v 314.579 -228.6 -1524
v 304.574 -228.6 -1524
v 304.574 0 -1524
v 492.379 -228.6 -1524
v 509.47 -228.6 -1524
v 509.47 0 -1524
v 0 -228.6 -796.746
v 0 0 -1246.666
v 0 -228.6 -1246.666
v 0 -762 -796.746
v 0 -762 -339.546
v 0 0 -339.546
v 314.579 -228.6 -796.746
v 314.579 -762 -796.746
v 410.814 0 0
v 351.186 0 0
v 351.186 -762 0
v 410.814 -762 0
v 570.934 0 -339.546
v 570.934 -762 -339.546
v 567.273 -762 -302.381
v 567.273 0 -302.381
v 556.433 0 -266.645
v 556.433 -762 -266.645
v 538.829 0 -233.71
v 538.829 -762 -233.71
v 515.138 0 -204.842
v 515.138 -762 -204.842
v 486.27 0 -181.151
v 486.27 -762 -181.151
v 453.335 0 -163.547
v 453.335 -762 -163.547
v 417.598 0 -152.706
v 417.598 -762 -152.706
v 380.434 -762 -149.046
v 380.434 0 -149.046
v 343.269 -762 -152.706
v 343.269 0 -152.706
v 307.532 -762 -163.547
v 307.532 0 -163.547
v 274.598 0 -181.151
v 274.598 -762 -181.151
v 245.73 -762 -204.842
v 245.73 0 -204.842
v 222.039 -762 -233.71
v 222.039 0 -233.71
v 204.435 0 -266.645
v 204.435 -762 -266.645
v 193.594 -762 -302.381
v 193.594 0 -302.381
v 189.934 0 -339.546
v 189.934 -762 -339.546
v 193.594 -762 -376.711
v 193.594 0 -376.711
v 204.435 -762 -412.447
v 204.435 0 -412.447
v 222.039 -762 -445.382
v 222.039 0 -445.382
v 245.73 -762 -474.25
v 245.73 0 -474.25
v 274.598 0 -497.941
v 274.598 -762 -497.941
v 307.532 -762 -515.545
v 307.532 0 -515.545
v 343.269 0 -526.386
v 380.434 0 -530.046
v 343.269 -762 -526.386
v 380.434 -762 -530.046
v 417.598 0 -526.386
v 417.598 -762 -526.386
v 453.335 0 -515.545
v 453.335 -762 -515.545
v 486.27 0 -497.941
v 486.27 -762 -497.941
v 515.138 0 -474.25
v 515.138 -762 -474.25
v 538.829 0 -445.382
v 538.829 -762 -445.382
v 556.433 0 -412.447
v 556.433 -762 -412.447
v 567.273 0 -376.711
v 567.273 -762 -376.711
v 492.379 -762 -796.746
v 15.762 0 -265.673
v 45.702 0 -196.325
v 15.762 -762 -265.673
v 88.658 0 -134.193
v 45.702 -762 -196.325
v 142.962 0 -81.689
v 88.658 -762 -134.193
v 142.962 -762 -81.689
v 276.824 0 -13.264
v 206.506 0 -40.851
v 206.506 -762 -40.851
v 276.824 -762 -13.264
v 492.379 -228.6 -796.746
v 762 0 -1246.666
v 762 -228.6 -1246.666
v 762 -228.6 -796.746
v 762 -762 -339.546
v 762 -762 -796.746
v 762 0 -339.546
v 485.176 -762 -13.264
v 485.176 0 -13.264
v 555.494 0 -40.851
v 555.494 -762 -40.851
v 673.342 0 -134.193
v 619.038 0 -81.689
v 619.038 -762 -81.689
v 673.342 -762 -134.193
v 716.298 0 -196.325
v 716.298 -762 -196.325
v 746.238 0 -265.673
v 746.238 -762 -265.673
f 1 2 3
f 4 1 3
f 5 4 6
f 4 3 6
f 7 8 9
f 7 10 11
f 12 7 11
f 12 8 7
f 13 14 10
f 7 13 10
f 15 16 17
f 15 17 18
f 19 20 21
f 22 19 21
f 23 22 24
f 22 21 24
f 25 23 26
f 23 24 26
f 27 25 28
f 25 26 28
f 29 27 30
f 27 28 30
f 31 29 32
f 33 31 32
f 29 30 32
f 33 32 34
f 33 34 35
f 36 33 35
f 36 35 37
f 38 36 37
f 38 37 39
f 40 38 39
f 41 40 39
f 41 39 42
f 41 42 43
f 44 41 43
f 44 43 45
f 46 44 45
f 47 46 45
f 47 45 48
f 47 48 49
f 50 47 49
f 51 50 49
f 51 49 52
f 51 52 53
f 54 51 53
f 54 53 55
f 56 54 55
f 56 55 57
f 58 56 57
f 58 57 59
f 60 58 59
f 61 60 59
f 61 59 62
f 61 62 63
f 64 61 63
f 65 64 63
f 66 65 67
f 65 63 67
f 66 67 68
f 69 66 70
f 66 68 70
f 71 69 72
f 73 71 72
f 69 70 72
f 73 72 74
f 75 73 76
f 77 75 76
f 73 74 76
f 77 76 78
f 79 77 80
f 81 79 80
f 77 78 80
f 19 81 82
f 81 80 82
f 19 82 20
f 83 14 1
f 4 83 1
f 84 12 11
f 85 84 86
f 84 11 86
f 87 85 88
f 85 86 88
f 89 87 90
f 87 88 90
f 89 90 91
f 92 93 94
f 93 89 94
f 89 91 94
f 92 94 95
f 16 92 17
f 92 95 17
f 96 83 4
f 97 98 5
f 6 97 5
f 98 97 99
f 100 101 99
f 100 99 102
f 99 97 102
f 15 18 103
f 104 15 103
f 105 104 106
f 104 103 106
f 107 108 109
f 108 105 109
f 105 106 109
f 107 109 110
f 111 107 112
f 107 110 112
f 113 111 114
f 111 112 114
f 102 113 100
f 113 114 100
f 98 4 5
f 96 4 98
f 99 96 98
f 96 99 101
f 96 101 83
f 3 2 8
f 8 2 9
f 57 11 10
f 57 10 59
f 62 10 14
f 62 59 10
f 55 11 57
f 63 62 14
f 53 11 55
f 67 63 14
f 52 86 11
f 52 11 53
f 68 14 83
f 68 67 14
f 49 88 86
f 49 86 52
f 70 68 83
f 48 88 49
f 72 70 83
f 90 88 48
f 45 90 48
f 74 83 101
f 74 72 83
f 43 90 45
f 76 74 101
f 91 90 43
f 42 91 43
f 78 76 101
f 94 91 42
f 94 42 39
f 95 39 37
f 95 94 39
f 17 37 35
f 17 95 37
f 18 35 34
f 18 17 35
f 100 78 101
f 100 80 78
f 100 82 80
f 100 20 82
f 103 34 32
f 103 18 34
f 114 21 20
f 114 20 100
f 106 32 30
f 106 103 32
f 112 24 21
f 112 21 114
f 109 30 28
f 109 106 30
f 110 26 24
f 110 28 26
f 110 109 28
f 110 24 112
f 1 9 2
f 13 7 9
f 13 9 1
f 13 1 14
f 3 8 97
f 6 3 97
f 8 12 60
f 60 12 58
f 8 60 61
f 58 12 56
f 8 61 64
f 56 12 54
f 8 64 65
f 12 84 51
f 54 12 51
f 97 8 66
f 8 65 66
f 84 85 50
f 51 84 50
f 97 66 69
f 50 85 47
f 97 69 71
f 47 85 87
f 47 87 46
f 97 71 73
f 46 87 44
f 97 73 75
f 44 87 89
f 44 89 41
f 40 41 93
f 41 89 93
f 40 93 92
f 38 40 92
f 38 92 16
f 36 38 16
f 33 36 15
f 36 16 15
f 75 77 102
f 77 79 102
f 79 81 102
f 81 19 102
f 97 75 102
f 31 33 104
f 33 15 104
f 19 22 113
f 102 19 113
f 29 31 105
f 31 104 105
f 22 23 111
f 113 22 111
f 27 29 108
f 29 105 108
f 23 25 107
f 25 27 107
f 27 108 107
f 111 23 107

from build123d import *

# Parameters (mm, degrees)
F0_W     = 762
F0_H     = 1524
F1_DEPTH = 762
F4_DEPTH = 762.001
F5_DEPTH = 762.001
F6_DEPTH = 533.4
F8_DEPTH = 447.422


with BuildPart() as f1:
    # F0 (on Front) → F1 (new body)
    with BuildSketch(Plane.XZ):
        with Locations((381, -762)):
            Rectangle(F0_W, F0_H)
    extrude(amount=F1_DEPTH)

    # F3 (on face) + F2 (on face) → F4 (cut, through all)
    with BuildSketch(Plane.XZ.offset(762)):
        Polygon((762, -1246.666074), (509.469922, -1524), (762, -1524), align=None)
        Polygon((304.574043, -1524), (0, -1246.666074), (0, -1524), align=None)
    with BuildSketch(Plane.XZ.offset(762)):
        with BuildLine():
            Line((762, 0), (410.814423, 0))
            ThreePointArc((410.814423, 0), (647.486394, -106.600051), (762, -339.546025))
            Line((762, -339.546025), (762, 0))
        make_face()
        with BuildLine():
            Line((0, 0), (0, -339.546025))
            ThreePointArc((0, -339.546025), (114.513606, -106.600051), (351.185577, 0))
            Line((351.185577, 0), (0, 0))
        make_face()
    extrude(amount=-F4_DEPTH, mode=Mode.SUBTRACT)

    # F2 (on face) → F5 (cut, through all)
    with BuildSketch(Plane.XZ.offset(762)):
        with BuildLine():
            Line((380.433679, -339.546025), (189.933679, -339.546025))
            ThreePointArc((189.933679, -339.546025), (380.433679, -530.046025), (570.933679, -339.546025))
            Line((570.933679, -339.546025), (380.433679, -339.546025))
        make_face()
        with BuildLine():
            ThreePointArc((570.933679, -339.546025), (380.433679, -149.046025), (189.933679, -339.546025))
            Line((189.933679, -339.546025), (380.433679, -339.546025))
            Line((380.433679, -339.546025), (570.933679, -339.546025))
        make_face()
    extrude(amount=-F5_DEPTH, mode=Mode.SUBTRACT)

    # F2 (on face) → F6 (cut)
    with BuildSketch(Plane.XZ.offset(762)):
        Polygon((492.379, -796.746025), (492.379, -1524), (533.4, -1524), (762, -1524), (762, -1382.540822), (762, -796.746025), align=None)
        Polygon((0, -796.746025), (0, -1524), (228.6, -1524), (314.579, -1524), (314.579, -796.746025), align=None)
    extrude(amount=-F6_DEPTH, mode=Mode.SUBTRACT)

    # F7 (on face) → F8 (cut, through all)
    with BuildSketch(Plane(origin=(314.579, 0, 0), x_dir=(0, -1, 0), z_dir=(-1, 0, 0))):
        Polygon((762, -1524), (762, -796.746025), (228.6, -1524), align=None)
    extrude(amount=-F8_DEPTH, mode=Mode.SUBTRACT)


solid = f1.part
